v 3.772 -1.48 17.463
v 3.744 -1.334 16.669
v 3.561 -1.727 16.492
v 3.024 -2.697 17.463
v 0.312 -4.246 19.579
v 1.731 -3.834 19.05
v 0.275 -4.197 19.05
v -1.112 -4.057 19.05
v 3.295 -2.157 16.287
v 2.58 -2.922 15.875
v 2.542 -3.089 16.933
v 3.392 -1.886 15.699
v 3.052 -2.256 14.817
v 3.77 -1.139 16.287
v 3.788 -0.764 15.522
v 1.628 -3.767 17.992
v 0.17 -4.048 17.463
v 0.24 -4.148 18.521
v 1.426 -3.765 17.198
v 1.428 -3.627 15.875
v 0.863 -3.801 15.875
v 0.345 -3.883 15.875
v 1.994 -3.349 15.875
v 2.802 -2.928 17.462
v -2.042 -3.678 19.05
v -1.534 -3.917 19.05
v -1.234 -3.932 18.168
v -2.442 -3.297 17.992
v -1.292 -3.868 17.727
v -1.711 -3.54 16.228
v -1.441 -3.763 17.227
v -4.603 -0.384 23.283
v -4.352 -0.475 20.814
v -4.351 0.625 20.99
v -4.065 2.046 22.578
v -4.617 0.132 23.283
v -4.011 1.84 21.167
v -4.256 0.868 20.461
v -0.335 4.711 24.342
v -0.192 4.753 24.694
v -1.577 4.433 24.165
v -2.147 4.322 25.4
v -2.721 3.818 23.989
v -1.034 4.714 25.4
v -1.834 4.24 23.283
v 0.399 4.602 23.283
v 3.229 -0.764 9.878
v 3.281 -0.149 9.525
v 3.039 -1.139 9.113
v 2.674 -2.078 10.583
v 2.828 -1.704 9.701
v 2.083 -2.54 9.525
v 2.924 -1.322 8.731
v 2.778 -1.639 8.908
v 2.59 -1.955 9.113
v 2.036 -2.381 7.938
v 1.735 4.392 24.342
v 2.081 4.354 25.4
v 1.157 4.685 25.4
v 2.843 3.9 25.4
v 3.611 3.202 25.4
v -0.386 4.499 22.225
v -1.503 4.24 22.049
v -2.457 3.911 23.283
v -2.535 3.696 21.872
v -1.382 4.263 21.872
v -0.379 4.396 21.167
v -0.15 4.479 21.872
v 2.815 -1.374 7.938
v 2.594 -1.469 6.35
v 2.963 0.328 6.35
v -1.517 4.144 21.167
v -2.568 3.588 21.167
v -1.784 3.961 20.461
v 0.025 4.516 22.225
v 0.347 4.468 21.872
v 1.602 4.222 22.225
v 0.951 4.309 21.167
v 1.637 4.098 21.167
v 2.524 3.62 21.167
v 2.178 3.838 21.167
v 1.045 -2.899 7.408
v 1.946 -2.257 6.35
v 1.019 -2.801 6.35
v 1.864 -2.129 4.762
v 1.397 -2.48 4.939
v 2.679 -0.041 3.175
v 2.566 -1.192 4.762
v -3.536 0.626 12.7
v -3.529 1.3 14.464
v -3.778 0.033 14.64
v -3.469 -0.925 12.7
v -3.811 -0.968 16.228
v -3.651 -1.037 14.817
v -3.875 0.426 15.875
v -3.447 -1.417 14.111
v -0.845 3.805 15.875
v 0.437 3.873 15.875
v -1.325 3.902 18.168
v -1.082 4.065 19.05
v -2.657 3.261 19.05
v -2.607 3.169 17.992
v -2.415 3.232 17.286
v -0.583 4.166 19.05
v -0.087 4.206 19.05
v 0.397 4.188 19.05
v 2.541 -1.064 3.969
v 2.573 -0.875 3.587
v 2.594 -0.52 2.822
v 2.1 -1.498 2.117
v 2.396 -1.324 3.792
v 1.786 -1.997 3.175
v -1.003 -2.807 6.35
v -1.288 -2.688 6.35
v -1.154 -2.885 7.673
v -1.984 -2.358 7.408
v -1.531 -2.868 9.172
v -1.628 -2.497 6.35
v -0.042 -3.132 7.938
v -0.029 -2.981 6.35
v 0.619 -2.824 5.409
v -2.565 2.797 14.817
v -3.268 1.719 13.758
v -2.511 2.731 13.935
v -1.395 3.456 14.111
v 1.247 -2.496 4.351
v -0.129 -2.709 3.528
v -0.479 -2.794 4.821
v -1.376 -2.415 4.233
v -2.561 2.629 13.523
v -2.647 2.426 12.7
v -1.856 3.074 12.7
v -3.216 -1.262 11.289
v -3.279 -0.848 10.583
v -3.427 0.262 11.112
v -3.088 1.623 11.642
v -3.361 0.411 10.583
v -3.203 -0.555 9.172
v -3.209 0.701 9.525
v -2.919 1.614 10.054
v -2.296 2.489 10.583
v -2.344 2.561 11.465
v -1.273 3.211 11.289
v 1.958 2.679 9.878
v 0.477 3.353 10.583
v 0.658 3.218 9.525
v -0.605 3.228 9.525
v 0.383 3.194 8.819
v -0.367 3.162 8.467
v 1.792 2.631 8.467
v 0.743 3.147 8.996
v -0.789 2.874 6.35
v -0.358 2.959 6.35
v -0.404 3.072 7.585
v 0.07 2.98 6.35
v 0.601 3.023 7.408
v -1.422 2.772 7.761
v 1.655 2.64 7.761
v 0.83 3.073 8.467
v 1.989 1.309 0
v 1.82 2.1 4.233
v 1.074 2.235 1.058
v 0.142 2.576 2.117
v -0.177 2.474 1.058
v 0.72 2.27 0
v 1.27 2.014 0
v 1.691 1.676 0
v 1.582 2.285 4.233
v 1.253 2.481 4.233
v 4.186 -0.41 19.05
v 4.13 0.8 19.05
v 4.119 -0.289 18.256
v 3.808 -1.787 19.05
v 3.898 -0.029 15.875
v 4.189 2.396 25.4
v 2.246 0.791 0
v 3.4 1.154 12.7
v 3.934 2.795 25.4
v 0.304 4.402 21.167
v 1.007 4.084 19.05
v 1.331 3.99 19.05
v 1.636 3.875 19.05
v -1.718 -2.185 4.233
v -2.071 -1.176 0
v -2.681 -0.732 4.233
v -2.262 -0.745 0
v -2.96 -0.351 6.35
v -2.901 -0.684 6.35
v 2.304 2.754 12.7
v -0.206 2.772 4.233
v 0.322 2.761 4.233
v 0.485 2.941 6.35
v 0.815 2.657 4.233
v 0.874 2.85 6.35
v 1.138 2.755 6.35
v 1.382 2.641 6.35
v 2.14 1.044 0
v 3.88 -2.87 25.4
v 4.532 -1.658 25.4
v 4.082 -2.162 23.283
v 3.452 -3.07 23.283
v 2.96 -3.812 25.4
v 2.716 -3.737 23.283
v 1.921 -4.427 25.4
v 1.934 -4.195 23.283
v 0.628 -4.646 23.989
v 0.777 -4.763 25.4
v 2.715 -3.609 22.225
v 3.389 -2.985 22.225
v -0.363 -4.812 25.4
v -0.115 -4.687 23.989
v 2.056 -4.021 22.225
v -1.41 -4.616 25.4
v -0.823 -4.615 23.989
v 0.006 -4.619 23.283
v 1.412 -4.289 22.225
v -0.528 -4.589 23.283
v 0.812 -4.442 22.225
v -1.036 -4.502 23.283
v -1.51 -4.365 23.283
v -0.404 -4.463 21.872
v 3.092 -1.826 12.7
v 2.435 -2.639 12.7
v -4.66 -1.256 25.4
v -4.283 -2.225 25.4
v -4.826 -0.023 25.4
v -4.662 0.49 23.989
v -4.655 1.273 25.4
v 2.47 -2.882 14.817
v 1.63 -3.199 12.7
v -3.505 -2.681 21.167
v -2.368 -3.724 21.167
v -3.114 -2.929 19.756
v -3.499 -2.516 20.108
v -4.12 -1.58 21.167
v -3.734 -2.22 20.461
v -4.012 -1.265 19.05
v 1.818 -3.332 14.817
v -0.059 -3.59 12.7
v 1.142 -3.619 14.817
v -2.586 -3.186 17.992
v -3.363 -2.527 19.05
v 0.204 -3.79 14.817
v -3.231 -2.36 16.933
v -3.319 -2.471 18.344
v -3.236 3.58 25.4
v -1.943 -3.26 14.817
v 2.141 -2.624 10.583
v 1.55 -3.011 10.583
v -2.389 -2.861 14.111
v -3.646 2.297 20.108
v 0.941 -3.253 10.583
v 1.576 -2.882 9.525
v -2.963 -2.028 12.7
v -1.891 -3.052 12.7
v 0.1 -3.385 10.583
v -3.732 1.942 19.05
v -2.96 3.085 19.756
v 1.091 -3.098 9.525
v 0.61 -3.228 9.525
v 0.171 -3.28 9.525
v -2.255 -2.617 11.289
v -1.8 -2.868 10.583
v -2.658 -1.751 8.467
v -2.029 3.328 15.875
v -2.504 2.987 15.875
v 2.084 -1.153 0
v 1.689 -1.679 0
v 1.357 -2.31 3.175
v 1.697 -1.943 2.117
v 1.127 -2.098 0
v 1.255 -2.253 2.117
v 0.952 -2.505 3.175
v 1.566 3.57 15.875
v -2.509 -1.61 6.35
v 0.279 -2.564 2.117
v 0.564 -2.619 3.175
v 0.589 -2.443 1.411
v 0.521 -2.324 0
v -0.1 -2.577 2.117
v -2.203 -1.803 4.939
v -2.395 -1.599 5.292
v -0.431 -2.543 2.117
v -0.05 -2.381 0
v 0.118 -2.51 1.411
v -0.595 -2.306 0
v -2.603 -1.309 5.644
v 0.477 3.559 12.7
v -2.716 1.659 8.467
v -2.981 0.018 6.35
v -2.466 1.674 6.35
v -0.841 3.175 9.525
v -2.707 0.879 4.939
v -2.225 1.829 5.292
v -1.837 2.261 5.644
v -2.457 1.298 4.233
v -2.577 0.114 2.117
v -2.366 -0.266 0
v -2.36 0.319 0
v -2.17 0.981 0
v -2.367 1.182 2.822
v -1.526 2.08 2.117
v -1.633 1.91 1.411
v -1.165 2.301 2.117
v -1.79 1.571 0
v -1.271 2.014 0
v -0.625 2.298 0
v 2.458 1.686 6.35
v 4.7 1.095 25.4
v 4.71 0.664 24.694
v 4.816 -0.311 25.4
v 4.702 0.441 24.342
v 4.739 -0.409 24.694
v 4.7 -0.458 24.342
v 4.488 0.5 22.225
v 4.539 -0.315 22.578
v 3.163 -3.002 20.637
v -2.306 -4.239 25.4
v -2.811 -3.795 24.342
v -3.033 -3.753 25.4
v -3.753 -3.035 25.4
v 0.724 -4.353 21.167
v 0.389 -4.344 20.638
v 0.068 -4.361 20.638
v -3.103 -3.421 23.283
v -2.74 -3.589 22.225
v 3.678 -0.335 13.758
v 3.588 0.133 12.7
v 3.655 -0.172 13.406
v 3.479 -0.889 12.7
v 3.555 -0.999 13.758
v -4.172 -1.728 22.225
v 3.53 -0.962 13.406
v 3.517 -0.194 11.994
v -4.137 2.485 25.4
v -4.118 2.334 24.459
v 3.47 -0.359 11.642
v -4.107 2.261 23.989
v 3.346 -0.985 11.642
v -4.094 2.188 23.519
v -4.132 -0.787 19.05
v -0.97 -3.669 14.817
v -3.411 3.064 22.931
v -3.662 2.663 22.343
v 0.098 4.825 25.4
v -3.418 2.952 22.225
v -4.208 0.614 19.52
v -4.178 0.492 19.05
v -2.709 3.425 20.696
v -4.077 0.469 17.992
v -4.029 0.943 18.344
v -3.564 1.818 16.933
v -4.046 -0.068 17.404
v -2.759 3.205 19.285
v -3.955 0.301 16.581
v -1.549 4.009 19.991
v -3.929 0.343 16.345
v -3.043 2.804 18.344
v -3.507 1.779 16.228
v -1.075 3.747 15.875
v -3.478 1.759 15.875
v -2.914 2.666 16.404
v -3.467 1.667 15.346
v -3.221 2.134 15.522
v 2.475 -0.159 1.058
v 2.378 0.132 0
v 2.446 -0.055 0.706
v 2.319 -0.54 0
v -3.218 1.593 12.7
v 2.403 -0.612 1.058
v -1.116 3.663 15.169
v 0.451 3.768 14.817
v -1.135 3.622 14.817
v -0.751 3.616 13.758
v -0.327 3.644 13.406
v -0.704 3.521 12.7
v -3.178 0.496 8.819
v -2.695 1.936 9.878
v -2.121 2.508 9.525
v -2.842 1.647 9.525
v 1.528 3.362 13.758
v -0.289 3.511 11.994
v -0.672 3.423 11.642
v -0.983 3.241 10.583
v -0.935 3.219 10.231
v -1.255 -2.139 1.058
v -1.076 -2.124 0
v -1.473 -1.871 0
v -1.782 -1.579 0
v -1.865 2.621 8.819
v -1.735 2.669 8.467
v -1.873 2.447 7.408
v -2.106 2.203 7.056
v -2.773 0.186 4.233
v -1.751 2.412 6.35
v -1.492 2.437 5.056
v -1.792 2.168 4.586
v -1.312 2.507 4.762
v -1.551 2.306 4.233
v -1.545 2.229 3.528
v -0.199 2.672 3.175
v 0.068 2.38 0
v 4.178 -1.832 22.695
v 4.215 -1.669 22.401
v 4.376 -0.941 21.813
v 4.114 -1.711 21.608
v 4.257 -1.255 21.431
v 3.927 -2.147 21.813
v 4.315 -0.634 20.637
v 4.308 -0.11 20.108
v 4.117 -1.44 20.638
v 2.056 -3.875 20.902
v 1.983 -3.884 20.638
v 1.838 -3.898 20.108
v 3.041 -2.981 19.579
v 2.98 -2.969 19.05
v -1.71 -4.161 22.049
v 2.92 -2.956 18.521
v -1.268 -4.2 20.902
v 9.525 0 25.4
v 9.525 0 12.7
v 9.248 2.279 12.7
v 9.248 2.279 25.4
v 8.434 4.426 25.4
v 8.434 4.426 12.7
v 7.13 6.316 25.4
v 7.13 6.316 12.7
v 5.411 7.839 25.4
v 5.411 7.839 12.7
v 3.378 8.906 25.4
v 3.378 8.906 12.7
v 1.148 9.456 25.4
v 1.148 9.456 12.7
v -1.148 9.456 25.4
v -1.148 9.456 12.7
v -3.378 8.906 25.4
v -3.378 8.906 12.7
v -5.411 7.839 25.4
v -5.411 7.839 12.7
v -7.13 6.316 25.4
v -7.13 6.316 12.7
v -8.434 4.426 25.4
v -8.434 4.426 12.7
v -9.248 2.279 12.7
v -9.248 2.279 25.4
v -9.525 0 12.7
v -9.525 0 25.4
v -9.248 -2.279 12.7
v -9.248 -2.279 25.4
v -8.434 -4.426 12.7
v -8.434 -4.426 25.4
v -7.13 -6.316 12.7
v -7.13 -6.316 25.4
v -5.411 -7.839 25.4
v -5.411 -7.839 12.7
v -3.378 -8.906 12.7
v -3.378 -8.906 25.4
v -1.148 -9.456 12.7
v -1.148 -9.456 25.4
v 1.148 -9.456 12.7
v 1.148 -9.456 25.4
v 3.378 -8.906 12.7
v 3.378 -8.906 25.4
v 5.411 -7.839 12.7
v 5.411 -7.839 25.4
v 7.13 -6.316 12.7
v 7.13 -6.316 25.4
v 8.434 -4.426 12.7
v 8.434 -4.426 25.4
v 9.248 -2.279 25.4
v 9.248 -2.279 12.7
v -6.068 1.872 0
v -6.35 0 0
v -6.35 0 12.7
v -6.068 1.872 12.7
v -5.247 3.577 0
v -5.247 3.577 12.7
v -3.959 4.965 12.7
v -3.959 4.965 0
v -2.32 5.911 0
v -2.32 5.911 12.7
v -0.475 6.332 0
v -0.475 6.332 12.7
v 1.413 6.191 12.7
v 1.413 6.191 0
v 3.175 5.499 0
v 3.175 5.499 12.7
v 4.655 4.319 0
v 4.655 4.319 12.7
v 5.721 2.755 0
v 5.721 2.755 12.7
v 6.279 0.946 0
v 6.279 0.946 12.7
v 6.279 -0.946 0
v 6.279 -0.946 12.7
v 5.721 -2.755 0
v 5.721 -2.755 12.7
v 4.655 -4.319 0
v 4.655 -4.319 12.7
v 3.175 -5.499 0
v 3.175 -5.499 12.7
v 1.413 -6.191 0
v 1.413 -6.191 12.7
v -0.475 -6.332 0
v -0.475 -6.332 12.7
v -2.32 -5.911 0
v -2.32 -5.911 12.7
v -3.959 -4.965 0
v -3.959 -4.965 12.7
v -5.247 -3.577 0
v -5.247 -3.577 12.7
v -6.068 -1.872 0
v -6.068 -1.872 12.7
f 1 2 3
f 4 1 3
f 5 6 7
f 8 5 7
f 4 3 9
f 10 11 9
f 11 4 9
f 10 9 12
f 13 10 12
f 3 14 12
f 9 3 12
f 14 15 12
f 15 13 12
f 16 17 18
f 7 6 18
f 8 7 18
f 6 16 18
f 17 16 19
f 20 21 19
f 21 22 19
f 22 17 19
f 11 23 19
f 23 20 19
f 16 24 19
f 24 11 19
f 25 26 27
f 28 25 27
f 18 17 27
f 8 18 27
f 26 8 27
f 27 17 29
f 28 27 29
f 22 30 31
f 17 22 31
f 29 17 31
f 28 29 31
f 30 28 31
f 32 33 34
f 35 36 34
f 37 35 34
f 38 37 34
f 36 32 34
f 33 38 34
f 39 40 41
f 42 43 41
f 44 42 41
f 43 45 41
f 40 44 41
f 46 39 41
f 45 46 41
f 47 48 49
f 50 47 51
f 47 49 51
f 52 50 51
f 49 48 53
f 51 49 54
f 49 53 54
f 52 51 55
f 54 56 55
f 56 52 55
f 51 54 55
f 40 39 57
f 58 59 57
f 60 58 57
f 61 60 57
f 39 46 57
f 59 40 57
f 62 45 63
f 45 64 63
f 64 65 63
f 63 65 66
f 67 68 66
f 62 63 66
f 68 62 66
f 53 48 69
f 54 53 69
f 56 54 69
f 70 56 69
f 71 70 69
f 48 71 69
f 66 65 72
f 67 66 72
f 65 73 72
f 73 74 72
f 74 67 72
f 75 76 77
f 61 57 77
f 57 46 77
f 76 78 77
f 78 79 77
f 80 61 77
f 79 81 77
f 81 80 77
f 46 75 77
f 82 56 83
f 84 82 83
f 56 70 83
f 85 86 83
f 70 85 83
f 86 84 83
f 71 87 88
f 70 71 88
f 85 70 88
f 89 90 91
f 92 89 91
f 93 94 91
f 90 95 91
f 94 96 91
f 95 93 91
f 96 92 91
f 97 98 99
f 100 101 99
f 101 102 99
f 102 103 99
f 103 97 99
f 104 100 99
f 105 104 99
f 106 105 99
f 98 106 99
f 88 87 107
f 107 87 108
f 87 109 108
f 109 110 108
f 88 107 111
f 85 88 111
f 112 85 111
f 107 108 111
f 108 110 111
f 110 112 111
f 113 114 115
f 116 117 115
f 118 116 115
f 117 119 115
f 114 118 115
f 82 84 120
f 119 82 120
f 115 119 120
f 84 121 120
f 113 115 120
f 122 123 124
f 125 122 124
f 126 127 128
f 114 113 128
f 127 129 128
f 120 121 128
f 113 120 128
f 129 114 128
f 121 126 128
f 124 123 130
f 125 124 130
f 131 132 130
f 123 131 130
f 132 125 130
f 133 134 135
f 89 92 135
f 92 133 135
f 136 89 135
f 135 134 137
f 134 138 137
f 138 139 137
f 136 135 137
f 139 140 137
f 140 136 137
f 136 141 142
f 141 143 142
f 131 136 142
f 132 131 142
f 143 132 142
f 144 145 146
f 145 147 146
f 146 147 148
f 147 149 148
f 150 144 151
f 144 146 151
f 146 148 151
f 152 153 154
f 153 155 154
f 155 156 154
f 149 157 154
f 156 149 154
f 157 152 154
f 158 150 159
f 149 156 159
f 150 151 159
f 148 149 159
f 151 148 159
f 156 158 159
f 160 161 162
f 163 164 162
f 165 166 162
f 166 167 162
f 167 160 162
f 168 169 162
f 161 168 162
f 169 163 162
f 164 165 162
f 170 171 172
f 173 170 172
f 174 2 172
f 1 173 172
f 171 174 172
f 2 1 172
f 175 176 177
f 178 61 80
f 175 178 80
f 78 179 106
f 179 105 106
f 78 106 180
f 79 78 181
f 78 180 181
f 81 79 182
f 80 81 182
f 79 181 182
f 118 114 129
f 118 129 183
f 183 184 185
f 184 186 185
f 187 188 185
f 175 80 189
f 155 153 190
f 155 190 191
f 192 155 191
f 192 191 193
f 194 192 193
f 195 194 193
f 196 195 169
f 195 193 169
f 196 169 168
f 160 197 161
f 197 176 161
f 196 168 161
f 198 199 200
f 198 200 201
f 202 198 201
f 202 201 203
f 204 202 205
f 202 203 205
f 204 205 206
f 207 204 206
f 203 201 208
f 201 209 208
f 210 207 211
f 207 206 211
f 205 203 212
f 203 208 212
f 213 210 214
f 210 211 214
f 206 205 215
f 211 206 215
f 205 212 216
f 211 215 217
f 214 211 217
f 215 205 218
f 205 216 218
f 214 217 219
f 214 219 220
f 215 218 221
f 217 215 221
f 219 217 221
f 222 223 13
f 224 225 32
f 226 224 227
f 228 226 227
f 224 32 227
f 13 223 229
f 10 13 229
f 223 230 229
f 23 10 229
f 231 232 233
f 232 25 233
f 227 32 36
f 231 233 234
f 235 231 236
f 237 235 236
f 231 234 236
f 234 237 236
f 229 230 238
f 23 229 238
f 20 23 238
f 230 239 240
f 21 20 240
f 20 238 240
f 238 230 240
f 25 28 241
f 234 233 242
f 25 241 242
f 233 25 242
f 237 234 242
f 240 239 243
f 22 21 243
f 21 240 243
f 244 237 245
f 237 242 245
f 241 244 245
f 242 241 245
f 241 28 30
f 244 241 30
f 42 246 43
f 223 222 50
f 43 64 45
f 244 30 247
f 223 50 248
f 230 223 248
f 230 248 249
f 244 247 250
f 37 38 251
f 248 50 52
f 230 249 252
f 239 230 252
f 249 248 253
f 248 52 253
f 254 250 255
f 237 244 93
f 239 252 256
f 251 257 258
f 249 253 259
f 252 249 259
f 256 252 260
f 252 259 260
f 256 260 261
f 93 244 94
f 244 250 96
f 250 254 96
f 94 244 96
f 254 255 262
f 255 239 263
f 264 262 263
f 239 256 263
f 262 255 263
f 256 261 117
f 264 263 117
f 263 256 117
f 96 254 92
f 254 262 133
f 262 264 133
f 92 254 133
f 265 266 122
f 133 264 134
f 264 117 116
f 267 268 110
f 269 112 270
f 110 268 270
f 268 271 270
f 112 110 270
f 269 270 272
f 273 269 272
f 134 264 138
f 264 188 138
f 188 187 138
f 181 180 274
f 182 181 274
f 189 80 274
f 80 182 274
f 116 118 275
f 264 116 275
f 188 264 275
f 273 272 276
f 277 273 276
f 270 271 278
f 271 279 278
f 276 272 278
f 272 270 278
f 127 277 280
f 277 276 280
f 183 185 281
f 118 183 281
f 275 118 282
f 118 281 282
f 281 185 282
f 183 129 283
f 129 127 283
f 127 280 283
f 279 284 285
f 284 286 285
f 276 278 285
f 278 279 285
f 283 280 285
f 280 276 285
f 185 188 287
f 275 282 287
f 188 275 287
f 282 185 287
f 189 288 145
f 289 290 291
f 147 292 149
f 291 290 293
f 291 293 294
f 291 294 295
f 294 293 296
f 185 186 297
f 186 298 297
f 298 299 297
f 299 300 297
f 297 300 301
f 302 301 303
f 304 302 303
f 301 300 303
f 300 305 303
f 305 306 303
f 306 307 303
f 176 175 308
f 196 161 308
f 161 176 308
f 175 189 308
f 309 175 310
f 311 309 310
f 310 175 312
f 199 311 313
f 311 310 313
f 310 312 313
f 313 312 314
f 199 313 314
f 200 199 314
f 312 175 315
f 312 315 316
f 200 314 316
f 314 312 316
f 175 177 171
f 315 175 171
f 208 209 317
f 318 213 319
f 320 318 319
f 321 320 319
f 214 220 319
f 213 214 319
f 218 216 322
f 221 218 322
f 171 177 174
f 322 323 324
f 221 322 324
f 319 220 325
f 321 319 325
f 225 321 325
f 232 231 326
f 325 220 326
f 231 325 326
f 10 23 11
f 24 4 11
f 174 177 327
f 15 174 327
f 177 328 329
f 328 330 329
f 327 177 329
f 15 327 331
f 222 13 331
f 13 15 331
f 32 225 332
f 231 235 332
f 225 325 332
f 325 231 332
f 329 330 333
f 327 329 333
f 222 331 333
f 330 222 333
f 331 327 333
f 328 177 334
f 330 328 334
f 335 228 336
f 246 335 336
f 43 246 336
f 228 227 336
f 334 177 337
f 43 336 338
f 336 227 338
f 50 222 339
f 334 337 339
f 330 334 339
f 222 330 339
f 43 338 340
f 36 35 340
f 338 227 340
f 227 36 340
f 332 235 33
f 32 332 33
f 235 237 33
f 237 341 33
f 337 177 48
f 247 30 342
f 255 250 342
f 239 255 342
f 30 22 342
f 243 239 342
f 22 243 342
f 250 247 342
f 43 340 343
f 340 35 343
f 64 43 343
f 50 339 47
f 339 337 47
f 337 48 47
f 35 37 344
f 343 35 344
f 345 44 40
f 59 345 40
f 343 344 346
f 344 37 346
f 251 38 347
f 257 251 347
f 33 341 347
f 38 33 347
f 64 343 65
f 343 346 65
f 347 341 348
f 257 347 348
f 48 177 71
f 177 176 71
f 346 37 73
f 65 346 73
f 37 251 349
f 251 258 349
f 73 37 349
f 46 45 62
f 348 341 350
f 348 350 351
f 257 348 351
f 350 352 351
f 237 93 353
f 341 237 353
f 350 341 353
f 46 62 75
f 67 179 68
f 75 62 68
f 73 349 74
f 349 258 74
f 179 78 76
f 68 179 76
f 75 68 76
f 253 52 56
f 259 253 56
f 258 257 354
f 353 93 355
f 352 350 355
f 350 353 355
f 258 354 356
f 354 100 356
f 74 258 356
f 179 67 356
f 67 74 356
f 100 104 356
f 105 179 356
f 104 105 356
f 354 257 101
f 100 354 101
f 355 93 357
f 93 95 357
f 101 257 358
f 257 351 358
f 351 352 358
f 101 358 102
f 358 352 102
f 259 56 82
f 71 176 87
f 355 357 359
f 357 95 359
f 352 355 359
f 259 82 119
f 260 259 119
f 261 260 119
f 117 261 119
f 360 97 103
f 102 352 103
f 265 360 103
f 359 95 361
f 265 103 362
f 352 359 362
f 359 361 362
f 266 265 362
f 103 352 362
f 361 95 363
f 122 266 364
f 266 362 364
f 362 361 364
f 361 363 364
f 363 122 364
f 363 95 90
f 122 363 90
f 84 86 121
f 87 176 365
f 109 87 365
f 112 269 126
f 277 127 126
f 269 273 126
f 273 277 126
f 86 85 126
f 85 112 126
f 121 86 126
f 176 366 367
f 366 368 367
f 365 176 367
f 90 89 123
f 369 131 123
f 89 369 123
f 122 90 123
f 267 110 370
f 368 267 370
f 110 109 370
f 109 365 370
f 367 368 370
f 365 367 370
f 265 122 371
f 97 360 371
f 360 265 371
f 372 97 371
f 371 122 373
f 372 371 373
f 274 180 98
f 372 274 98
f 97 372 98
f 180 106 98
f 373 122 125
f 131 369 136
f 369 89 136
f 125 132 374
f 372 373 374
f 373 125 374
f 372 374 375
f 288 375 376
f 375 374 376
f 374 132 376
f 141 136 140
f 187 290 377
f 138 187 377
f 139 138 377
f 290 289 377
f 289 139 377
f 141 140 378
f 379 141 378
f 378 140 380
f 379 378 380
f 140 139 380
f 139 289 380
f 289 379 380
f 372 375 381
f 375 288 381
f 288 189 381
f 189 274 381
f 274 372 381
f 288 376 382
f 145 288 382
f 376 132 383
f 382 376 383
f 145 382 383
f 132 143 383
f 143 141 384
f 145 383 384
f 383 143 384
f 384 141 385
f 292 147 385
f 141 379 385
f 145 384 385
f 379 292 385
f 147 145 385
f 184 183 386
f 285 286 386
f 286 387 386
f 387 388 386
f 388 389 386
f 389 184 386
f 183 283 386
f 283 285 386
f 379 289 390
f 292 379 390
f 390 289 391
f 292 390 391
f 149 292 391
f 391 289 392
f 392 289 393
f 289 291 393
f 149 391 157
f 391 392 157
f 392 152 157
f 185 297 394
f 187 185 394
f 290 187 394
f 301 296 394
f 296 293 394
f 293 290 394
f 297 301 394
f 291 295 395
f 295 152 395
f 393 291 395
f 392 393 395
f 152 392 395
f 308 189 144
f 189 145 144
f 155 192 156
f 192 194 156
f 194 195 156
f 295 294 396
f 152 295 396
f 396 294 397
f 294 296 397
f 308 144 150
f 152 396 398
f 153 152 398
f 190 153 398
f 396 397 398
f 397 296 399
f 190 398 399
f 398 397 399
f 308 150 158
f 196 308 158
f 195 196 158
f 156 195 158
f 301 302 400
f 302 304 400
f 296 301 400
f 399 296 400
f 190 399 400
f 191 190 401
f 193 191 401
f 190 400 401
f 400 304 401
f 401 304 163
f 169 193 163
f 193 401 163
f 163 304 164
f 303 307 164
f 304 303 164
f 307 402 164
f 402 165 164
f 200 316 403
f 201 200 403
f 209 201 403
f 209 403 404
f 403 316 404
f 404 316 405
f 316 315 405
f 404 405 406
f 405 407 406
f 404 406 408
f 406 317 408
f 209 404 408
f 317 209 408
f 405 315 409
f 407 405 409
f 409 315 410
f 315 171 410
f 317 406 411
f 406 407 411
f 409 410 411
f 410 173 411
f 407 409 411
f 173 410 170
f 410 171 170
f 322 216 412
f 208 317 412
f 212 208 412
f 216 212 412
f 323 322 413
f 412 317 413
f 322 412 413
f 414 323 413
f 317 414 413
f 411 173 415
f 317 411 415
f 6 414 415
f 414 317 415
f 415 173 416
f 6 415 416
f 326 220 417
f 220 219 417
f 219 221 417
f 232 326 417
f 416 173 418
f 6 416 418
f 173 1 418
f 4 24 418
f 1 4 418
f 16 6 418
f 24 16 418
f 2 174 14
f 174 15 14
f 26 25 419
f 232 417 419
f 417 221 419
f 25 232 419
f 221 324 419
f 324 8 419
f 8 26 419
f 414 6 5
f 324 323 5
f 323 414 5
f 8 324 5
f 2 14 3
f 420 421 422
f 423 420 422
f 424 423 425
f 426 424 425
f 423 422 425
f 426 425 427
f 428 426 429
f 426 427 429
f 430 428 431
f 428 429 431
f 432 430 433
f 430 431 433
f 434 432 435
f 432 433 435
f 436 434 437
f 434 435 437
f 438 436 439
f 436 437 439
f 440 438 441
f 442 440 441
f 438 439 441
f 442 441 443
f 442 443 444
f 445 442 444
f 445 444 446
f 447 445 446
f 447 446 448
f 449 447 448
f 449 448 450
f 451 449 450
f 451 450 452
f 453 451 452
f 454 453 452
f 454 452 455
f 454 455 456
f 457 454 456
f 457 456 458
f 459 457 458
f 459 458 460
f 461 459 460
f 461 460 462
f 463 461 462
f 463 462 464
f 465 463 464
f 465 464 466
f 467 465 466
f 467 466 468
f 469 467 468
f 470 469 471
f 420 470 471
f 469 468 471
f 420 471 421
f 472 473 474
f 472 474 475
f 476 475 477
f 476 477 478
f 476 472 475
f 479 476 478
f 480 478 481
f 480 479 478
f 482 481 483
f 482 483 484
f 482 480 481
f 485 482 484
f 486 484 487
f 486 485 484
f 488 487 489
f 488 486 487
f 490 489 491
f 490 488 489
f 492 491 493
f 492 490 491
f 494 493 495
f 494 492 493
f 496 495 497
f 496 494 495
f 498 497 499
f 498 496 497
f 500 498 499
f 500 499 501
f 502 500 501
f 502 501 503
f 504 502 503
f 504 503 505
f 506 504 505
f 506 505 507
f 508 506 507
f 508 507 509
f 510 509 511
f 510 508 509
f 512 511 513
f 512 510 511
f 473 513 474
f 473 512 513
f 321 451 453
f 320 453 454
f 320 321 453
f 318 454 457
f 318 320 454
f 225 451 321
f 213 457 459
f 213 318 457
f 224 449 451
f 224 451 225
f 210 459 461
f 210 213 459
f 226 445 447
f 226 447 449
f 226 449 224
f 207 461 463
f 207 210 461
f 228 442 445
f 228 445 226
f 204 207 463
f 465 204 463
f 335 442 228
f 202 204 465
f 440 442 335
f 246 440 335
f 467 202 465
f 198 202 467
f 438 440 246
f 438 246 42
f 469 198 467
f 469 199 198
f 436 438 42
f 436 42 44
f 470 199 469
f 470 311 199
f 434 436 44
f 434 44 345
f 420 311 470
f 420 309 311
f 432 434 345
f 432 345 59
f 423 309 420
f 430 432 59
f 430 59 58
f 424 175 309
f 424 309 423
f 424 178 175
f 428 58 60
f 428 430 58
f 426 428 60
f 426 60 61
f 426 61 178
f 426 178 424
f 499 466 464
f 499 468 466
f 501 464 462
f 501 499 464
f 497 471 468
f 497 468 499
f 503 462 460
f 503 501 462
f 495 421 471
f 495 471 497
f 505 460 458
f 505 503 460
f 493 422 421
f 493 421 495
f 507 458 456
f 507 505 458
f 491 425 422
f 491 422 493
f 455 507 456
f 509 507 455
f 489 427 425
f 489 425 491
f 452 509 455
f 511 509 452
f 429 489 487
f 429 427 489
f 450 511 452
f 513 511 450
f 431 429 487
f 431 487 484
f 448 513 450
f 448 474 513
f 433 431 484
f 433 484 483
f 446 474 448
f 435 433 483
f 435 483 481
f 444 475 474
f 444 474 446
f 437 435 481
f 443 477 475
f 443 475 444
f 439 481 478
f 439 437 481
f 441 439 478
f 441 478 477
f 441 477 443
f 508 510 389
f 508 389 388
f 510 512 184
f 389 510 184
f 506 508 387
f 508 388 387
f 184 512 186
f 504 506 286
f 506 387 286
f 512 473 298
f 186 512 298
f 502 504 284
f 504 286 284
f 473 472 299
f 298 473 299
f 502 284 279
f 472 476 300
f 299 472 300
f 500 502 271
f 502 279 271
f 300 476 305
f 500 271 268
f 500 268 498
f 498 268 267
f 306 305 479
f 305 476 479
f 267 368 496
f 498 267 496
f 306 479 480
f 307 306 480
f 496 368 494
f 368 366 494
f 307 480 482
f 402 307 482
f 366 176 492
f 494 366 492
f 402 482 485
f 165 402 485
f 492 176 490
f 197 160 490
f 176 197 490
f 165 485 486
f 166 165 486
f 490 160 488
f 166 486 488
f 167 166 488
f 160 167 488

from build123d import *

# Parameters (mm, degrees)
SKETCH1_R           = 9.525
BOSS_EXTRUDE1_DEPTH = 25.4
SKETCH4_R           = 9.525
SKETCH4_R_2         = 6.35
CUT_EXTRUDE1_DEPTH  = 12.7


with BuildPart() as part:
    # Sketch1 → Boss-Extrude1 (new body)
    with BuildSketch(Plane.XY):
        Circle(SKETCH1_R)
    extrude(amount=BOSS_EXTRUDE1_DEPTH)

    # Cut-Loft1: read off the stored shape, not the designer's step
    # Cut-Loft1: loft between two sections, ruled curve by curve
    cut_loft1_from = [
        Edge.make_bspline([(4.189007655, 2.396349487, 25.4), (8.981706629, -5.981665824, 25.4), (0.603691318, -10.774364798, 25.4), (-4.189007655, -2.396349487, 25.4), (-8.981706629, 5.981665824, 25.4), (-0.603691318, 10.774364798, 25.4), (4.189007655, 2.396349487, 25.4)], [0, 0, 0, 0, 0.5, 0.5, 0.5, 1, 1, 1, 1], 3, [1, 0.333333333, 0.333333333, 1, 0.333333333, 0.333333333, 1]),
    ]
    cut_loft1_to = [
        Edge.make_bspline([(2.245993729, 0.791115497, 0), (3.828224724, -3.700871962, 0), (-0.663762735, -5.283102956, 0), (-2.245993729, -0.791115497, 0), (-3.828224724, 3.700871962, 0), (0.663762735, 5.283102956, 0), (2.245993729, 0.791115497, 0)], [0, 0, 0, 0, 0.5, 0.5, 0.5, 1, 1, 1, 1], 3, [1, 0.333333333, 0.333333333, 1, 0.333333333, 0.333333333, 1]),
    ]
    cut_loft1 = Solid(Shell([*[Face.make_surface_from_curves(cut_loft1_from[k], cut_loft1_to[k]) for k in range(1)], Face(Wire(cut_loft1_from)), Face(Wire(cut_loft1_to))]))
    add(cut_loft1, mode=Mode.SUBTRACT)

    # Sketch4 → Cut-Extrude1 (cut)
    with BuildSketch(Plane(origin=(0, 0, 0), x_dir=(-1, 0, 0), z_dir=(0, 0, -1))):
        Circle(SKETCH4_R)
        Circle(SKETCH4_R_2, mode=Mode.SUBTRACT)
    extrude(amount=-CUT_EXTRUDE1_DEPTH, mode=Mode.SUBTRACT)


solid = part.part
